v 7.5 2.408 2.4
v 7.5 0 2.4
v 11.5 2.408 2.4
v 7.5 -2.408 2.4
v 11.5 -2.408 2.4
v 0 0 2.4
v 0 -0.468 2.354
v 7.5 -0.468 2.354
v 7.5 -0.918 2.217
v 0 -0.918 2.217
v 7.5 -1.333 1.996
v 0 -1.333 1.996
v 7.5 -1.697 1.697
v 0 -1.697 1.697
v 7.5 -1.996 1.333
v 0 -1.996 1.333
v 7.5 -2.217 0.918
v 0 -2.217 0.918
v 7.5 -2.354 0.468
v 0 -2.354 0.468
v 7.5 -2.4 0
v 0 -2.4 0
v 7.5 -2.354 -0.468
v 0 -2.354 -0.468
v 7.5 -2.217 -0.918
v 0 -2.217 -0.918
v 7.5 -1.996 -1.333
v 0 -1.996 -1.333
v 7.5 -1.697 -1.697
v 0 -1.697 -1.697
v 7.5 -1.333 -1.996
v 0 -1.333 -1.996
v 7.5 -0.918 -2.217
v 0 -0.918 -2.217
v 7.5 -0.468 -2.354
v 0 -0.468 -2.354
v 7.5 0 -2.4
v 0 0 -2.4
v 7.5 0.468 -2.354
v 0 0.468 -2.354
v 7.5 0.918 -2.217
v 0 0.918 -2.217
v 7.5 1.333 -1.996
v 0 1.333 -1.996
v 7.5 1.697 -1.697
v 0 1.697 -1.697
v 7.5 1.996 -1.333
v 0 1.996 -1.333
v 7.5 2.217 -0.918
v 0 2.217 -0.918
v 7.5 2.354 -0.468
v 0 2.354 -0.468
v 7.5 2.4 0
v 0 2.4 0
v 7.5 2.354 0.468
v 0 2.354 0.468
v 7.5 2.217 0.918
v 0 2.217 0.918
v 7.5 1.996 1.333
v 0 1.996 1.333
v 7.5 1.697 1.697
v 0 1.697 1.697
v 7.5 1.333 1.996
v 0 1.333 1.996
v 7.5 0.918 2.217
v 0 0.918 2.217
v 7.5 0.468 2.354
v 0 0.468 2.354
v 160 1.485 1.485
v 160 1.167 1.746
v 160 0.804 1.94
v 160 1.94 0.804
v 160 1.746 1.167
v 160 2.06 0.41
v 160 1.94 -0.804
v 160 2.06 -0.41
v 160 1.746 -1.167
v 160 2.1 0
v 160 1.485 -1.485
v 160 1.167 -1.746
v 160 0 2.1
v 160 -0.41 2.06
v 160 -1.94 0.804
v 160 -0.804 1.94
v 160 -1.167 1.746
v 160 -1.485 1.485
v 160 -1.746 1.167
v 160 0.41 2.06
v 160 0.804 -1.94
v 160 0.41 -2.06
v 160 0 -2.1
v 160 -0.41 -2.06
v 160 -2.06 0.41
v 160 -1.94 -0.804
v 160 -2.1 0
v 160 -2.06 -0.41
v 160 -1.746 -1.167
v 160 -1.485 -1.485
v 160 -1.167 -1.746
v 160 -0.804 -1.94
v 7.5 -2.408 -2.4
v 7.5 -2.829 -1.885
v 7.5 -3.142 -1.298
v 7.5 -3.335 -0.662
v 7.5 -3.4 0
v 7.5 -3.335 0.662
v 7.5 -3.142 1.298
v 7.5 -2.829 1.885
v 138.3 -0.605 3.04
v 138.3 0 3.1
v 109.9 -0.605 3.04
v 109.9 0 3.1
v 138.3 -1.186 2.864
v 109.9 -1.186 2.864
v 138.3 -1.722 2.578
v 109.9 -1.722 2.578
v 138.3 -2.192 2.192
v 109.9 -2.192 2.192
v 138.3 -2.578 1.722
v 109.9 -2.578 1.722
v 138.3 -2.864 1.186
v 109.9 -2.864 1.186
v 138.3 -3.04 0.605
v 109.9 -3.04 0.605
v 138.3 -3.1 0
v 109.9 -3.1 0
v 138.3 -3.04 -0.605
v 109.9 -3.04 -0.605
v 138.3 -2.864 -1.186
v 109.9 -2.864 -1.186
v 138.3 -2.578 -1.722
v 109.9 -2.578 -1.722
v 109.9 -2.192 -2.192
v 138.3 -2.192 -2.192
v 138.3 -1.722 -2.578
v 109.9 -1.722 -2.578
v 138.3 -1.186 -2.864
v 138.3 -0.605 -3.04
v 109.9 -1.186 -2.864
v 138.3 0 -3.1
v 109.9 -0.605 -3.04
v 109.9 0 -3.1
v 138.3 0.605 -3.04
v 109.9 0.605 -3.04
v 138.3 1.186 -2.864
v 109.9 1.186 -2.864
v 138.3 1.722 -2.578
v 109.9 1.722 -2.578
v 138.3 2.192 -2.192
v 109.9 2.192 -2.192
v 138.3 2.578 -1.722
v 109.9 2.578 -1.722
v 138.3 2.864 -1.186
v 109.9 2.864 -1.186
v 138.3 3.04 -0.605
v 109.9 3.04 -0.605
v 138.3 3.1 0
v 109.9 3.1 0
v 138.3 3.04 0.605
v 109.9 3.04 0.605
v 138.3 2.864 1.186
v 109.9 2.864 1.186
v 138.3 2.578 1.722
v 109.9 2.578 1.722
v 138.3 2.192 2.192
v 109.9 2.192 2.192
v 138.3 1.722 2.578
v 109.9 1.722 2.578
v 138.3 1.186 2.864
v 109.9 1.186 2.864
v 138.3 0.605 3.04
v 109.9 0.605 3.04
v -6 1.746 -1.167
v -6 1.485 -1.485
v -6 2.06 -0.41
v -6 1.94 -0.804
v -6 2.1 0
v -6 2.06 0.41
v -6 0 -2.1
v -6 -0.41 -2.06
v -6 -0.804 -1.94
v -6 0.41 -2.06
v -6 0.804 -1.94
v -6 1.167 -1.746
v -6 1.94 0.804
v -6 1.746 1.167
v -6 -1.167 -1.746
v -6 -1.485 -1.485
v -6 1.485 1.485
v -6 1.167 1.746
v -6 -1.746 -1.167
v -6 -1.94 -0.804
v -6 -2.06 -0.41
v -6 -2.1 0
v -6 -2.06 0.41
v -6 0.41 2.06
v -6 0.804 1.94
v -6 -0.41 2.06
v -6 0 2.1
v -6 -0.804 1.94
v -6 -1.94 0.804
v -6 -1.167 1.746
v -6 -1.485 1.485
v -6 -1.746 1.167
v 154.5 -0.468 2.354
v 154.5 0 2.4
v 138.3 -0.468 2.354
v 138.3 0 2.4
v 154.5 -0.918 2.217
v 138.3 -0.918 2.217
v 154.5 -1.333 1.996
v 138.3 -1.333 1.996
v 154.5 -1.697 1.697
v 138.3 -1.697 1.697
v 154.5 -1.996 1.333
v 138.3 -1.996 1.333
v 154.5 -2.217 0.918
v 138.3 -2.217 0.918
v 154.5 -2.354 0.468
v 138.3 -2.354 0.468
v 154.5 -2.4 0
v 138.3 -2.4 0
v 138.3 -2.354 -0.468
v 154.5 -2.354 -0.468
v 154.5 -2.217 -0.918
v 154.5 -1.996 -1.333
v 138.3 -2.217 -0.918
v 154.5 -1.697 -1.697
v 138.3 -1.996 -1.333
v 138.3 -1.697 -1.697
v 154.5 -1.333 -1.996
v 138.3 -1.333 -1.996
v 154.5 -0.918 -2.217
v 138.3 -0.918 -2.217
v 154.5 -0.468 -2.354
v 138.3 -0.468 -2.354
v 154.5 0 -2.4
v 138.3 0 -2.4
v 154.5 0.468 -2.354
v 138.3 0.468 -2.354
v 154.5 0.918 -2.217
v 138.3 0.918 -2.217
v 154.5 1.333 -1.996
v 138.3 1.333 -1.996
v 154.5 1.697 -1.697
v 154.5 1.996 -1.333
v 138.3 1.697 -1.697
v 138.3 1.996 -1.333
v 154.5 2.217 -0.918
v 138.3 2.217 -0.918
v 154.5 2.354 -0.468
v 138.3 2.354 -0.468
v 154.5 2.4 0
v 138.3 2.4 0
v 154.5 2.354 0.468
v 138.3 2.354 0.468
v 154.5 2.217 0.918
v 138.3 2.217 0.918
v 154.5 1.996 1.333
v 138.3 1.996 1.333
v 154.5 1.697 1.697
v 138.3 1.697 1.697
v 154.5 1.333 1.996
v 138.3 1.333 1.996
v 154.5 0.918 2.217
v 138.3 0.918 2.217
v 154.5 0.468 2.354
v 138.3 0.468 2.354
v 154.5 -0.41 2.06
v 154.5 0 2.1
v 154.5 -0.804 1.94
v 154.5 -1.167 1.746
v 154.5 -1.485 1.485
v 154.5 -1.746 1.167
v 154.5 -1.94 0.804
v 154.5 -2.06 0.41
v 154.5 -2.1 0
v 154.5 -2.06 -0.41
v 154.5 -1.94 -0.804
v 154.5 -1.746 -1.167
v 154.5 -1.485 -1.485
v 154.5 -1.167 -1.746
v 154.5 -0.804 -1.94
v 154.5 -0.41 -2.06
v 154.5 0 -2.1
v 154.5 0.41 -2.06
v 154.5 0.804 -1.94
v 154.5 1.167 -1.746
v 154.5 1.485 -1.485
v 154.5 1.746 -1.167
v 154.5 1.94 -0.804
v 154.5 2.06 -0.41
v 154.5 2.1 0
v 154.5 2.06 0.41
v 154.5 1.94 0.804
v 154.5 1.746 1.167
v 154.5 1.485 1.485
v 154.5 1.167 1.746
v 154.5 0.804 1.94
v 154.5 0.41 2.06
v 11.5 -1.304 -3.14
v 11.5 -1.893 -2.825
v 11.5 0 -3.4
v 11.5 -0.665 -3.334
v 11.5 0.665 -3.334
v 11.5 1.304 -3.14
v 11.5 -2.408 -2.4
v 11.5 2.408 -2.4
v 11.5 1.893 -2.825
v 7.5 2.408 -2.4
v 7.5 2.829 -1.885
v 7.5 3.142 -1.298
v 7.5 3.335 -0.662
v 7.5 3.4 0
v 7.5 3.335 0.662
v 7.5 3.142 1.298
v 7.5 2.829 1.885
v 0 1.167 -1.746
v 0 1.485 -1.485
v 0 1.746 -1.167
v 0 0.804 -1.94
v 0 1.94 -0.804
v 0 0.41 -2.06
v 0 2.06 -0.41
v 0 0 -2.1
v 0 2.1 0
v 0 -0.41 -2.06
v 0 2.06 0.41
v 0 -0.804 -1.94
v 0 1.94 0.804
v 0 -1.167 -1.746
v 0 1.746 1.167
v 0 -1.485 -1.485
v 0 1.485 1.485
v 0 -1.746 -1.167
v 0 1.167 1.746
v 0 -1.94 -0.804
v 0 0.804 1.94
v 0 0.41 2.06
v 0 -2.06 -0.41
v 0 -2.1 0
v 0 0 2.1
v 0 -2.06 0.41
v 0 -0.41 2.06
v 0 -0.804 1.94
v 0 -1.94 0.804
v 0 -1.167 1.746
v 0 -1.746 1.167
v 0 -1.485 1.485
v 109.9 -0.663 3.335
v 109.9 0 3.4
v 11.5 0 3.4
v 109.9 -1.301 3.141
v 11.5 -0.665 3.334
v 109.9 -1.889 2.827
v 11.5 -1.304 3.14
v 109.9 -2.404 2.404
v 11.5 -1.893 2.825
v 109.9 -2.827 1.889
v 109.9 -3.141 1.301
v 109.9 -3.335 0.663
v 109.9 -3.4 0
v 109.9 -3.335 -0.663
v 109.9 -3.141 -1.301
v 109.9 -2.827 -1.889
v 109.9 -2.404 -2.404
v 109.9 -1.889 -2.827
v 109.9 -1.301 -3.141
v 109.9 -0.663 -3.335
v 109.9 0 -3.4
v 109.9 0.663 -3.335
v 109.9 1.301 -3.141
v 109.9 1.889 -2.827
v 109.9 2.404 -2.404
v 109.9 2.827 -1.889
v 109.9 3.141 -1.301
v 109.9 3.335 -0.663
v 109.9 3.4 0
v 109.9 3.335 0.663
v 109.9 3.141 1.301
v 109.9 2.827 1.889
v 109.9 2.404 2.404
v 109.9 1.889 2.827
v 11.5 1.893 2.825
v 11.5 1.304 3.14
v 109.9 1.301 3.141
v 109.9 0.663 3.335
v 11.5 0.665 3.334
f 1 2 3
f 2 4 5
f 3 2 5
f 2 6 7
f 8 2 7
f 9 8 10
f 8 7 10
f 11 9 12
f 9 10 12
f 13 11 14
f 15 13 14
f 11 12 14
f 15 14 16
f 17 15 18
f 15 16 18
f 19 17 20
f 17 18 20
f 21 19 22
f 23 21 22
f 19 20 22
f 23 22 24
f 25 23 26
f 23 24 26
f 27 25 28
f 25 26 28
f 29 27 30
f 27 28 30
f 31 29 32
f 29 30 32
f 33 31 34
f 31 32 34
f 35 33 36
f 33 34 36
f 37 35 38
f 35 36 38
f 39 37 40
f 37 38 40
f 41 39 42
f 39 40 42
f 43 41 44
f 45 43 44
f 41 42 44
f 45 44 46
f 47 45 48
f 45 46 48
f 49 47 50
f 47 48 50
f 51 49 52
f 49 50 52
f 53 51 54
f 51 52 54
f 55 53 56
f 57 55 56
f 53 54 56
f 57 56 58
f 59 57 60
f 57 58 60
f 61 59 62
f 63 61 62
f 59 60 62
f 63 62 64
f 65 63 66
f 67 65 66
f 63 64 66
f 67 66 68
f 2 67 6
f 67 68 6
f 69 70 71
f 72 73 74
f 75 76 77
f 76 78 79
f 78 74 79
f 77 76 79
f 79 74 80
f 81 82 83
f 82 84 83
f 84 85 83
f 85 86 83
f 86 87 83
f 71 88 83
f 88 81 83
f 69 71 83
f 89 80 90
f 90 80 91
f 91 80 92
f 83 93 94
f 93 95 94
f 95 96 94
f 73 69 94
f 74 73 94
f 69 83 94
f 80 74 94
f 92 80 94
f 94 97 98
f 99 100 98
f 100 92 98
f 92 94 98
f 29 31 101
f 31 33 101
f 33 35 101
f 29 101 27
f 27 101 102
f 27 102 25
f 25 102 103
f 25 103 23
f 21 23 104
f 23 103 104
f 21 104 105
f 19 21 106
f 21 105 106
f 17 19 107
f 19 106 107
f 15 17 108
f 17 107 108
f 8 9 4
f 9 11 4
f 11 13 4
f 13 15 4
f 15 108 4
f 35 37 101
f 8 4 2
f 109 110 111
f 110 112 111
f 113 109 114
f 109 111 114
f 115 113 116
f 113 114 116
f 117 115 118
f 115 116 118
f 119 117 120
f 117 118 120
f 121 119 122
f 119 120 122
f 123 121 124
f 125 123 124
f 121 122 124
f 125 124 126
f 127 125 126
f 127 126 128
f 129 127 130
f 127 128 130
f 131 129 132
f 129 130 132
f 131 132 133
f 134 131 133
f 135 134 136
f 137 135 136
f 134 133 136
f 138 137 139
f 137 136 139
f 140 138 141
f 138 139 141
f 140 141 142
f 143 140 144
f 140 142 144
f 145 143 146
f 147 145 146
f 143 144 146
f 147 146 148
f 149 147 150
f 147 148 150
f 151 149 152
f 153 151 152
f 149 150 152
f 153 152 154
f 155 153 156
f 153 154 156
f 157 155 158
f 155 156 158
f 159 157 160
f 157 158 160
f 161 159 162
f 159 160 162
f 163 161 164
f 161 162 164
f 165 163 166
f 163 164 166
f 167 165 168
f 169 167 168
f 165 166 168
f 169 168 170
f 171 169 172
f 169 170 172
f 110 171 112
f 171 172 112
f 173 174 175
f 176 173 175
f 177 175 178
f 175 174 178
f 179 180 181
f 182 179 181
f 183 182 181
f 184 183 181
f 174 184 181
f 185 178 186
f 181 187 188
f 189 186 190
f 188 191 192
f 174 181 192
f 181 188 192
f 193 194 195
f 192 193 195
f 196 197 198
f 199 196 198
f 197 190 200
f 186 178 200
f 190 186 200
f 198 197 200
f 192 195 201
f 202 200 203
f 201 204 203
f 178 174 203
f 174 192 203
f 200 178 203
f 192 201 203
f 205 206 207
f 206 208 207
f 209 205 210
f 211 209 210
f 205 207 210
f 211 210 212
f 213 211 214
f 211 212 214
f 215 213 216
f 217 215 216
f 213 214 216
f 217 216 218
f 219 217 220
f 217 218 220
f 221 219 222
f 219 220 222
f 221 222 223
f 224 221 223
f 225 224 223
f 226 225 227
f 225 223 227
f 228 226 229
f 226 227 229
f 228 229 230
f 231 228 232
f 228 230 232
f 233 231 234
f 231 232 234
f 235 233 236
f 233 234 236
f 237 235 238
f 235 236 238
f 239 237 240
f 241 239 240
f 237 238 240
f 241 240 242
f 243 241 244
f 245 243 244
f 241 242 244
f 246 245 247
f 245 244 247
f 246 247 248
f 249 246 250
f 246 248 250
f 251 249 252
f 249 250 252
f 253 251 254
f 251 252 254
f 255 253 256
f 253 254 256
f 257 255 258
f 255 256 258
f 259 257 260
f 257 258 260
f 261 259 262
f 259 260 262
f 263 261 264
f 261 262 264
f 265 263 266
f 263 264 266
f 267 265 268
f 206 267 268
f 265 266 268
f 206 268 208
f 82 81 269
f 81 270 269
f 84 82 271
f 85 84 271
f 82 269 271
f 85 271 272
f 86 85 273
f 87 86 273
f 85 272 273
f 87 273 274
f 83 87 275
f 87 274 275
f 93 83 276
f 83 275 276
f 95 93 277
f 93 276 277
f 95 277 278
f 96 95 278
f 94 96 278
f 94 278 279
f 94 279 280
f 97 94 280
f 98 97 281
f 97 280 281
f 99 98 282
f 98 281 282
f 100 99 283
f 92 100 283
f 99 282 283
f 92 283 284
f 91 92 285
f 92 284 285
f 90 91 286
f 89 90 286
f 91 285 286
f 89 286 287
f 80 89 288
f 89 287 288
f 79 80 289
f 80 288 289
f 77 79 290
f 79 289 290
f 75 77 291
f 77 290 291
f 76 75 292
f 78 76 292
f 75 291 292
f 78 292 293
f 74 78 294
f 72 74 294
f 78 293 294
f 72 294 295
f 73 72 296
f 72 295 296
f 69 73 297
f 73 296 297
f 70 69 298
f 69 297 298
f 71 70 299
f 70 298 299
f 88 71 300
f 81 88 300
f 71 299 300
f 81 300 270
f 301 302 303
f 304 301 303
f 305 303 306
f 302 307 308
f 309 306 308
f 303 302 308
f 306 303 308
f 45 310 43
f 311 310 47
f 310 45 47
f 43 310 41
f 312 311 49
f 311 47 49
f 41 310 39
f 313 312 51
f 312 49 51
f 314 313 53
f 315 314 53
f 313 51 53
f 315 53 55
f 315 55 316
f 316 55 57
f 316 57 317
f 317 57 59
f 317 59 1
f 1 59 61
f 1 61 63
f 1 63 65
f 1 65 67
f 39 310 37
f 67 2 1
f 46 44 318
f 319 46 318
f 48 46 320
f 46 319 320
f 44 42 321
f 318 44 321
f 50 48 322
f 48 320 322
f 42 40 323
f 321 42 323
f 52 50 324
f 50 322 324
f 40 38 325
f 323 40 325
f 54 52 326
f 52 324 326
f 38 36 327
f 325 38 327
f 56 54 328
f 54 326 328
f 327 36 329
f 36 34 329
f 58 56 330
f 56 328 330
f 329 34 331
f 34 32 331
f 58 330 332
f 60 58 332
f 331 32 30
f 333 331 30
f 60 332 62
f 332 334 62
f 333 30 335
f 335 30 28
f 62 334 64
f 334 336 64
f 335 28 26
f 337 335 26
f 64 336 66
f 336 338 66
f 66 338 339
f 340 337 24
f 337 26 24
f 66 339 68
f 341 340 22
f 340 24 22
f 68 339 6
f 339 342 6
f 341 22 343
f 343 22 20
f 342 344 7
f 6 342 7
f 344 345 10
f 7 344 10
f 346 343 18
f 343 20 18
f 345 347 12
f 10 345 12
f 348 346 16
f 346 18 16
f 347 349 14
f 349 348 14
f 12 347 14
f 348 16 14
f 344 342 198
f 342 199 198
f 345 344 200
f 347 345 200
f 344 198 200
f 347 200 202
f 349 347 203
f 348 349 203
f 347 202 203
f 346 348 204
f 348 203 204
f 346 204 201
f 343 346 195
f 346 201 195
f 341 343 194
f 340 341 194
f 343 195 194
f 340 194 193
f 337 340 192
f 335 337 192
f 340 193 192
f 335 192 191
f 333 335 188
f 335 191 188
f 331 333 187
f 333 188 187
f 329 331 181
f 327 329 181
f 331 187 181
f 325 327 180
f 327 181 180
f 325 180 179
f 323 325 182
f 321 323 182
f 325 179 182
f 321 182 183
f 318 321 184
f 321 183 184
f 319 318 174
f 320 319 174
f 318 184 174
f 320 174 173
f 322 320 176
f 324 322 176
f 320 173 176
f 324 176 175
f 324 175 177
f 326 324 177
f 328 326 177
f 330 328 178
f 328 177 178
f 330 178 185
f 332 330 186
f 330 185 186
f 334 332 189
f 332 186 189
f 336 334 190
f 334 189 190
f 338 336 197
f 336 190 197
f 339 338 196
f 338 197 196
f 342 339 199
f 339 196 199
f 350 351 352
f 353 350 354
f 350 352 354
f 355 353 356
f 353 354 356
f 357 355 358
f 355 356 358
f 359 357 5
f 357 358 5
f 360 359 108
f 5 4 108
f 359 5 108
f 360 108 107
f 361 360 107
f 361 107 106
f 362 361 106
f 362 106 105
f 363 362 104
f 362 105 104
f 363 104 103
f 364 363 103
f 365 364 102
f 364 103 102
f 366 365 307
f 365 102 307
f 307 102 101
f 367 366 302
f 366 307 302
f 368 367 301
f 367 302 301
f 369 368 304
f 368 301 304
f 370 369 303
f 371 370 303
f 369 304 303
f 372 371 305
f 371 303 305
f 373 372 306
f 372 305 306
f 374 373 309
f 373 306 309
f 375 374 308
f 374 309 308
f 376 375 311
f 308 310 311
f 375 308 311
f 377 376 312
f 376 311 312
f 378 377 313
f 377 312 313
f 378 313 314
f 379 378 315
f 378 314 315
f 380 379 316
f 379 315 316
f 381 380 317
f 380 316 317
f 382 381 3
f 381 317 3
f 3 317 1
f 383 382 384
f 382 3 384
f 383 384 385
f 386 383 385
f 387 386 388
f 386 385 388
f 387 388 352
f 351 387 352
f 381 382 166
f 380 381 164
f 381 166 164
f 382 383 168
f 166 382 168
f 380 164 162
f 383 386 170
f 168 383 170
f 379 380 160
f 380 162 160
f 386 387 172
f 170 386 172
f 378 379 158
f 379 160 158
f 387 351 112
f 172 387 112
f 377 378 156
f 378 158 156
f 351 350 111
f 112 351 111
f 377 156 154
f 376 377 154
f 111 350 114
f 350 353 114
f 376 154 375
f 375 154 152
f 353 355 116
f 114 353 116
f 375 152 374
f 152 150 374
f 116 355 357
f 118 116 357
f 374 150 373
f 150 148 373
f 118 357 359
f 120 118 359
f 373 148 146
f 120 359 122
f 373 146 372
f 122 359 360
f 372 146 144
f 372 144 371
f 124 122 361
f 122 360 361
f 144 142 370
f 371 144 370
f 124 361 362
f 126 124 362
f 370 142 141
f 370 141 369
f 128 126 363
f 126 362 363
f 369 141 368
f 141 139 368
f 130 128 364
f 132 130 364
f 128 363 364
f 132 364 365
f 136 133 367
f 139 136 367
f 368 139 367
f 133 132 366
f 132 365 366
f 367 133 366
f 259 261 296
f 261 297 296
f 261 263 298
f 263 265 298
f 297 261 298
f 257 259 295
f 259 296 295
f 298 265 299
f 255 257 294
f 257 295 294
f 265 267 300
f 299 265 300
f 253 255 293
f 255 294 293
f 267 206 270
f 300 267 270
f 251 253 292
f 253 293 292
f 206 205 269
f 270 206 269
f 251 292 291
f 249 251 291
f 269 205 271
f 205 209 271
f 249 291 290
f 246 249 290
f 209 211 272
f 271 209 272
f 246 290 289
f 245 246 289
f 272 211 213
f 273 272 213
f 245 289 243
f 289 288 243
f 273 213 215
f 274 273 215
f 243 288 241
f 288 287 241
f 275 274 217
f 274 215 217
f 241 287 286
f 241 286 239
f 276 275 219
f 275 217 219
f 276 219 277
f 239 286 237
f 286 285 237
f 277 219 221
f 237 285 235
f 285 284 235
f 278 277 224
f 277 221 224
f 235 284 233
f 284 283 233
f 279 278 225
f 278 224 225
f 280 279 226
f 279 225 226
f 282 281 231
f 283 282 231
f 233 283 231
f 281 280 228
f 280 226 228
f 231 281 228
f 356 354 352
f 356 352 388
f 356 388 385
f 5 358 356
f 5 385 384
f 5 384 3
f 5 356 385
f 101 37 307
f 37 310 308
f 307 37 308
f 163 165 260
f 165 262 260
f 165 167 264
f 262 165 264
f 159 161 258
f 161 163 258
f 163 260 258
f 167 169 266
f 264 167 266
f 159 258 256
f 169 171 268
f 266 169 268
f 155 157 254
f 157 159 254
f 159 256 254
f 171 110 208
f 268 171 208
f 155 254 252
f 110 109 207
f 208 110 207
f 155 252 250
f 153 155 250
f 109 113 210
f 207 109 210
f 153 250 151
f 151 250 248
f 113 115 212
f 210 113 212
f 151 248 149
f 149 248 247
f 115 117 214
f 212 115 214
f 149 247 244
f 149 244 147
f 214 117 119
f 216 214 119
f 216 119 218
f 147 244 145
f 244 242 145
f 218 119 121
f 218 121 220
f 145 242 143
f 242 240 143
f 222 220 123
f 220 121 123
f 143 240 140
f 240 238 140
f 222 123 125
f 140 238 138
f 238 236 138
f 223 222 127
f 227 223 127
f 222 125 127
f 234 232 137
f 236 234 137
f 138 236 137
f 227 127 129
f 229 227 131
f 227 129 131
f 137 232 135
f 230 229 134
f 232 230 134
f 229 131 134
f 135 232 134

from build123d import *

# Parameters (mm, degrees)
CUT_EXTRUDE1_REACH             = 162.072
SKETCH2_W                      = 4
SKETCH2_H                      = 1
CUT_EXTRUDE1_DIRECTION_2_REACH = 162.072


with BuildPart() as part:
    # Sketch1 → Revolve1 (revolve)
    with BuildSketch(Plane(origin=(0, 0, 0), x_dir=(1, 0, 0), z_dir=(0, 1, 0)), mode=Mode.PRIVATE) as revolve1_sk:
        Polygon((0, 2.4), (0, 2.1), (-6, 2.1), (-6, 0), (160, 0), (160, 2.1), (154.5, 2.1), (154.5, 2.4), (138.3, 2.4), (138.3, 3.1), (109.9, 3.1), (109.9, 3.4), (7.5, 3.4), (7.5, 2.4), align=None)
    revolve(revolve1_sk.sketch.rotate(Axis((-12.266501292, 0, 0), (1, 0, 0)), 180), axis=Axis((-12.266501292, 0, 0), (1, 0, 0)))

    # Sketch2 → Cut-Extrude1 (cut, up to next)
    with BuildSketch(Plane(origin=(0, 0, 0), x_dir=(1, 0, 0), z_dir=(0, 1, 0)), mode=Mode.PRIVATE) as cut_extrude1_sk1:
        with Locations((9.5, 2.9)):
            Rectangle(SKETCH2_W, SKETCH2_H)
    cut_extrude1_tool1 = extrude(cut_extrude1_sk1.sketch, amount=-CUT_EXTRUDE1_REACH, mode=Mode.PRIVATE) & part.part
    # Sketch2 → Cut-Extrude1 (cut, up to next)
    with BuildSketch(Plane(origin=(0, 0, 0), x_dir=(1, 0, 0), z_dir=(0, 1, 0)), mode=Mode.PRIVATE) as cut_extrude1_sk2:
        with Locations((9.5, -2.9)):
            Rectangle(SKETCH2_W, SKETCH2_H)
    cut_extrude1_tool2 = extrude(cut_extrude1_sk2.sketch, amount=-CUT_EXTRUDE1_REACH, mode=Mode.PRIVATE) & part.part
    add(cut_extrude1_tool1.solids().sort_by_distance((9.5, 0, -2.9))[0], mode=Mode.SUBTRACT)
    add(cut_extrude1_tool2.solids().sort_by_distance((9.5, 0, 2.9))[0], mode=Mode.SUBTRACT)

    # Sketch2 → Cut-Extrude1 direction 2 (cut, up to next)
    with BuildSketch(Plane(origin=(0, 0, 0), x_dir=(1, 0, 0), z_dir=(0, 1, 0)), mode=Mode.PRIVATE) as cut_extrude1_direction_2_sk1:
        with Locations((9.5, 2.9)):
            Rectangle(SKETCH2_W, SKETCH2_H)
    cut_extrude1_direction_2_tool1 = extrude(cut_extrude1_direction_2_sk1.sketch, amount=CUT_EXTRUDE1_DIRECTION_2_REACH, mode=Mode.PRIVATE) & part.part
    # Sketch2 → Cut-Extrude1 direction 2 (cut, up to next)
    with BuildSketch(Plane(origin=(0, 0, 0), x_dir=(1, 0, 0), z_dir=(0, 1, 0)), mode=Mode.PRIVATE) as cut_extrude1_direction_2_sk2:
        with Locations((9.5, -2.9)):
            Rectangle(SKETCH2_W, SKETCH2_H)
    cut_extrude1_direction_2_tool2 = extrude(cut_extrude1_direction_2_sk2.sketch, amount=CUT_EXTRUDE1_DIRECTION_2_REACH, mode=Mode.PRIVATE) & part.part
    add(cut_extrude1_direction_2_tool1.solids().sort_by_distance((9.5, 0, -2.9))[0], mode=Mode.SUBTRACT)
    add(cut_extrude1_direction_2_tool2.solids().sort_by_distance((9.5, 0, 2.9))[0], mode=Mode.SUBTRACT)


solid = part.part
